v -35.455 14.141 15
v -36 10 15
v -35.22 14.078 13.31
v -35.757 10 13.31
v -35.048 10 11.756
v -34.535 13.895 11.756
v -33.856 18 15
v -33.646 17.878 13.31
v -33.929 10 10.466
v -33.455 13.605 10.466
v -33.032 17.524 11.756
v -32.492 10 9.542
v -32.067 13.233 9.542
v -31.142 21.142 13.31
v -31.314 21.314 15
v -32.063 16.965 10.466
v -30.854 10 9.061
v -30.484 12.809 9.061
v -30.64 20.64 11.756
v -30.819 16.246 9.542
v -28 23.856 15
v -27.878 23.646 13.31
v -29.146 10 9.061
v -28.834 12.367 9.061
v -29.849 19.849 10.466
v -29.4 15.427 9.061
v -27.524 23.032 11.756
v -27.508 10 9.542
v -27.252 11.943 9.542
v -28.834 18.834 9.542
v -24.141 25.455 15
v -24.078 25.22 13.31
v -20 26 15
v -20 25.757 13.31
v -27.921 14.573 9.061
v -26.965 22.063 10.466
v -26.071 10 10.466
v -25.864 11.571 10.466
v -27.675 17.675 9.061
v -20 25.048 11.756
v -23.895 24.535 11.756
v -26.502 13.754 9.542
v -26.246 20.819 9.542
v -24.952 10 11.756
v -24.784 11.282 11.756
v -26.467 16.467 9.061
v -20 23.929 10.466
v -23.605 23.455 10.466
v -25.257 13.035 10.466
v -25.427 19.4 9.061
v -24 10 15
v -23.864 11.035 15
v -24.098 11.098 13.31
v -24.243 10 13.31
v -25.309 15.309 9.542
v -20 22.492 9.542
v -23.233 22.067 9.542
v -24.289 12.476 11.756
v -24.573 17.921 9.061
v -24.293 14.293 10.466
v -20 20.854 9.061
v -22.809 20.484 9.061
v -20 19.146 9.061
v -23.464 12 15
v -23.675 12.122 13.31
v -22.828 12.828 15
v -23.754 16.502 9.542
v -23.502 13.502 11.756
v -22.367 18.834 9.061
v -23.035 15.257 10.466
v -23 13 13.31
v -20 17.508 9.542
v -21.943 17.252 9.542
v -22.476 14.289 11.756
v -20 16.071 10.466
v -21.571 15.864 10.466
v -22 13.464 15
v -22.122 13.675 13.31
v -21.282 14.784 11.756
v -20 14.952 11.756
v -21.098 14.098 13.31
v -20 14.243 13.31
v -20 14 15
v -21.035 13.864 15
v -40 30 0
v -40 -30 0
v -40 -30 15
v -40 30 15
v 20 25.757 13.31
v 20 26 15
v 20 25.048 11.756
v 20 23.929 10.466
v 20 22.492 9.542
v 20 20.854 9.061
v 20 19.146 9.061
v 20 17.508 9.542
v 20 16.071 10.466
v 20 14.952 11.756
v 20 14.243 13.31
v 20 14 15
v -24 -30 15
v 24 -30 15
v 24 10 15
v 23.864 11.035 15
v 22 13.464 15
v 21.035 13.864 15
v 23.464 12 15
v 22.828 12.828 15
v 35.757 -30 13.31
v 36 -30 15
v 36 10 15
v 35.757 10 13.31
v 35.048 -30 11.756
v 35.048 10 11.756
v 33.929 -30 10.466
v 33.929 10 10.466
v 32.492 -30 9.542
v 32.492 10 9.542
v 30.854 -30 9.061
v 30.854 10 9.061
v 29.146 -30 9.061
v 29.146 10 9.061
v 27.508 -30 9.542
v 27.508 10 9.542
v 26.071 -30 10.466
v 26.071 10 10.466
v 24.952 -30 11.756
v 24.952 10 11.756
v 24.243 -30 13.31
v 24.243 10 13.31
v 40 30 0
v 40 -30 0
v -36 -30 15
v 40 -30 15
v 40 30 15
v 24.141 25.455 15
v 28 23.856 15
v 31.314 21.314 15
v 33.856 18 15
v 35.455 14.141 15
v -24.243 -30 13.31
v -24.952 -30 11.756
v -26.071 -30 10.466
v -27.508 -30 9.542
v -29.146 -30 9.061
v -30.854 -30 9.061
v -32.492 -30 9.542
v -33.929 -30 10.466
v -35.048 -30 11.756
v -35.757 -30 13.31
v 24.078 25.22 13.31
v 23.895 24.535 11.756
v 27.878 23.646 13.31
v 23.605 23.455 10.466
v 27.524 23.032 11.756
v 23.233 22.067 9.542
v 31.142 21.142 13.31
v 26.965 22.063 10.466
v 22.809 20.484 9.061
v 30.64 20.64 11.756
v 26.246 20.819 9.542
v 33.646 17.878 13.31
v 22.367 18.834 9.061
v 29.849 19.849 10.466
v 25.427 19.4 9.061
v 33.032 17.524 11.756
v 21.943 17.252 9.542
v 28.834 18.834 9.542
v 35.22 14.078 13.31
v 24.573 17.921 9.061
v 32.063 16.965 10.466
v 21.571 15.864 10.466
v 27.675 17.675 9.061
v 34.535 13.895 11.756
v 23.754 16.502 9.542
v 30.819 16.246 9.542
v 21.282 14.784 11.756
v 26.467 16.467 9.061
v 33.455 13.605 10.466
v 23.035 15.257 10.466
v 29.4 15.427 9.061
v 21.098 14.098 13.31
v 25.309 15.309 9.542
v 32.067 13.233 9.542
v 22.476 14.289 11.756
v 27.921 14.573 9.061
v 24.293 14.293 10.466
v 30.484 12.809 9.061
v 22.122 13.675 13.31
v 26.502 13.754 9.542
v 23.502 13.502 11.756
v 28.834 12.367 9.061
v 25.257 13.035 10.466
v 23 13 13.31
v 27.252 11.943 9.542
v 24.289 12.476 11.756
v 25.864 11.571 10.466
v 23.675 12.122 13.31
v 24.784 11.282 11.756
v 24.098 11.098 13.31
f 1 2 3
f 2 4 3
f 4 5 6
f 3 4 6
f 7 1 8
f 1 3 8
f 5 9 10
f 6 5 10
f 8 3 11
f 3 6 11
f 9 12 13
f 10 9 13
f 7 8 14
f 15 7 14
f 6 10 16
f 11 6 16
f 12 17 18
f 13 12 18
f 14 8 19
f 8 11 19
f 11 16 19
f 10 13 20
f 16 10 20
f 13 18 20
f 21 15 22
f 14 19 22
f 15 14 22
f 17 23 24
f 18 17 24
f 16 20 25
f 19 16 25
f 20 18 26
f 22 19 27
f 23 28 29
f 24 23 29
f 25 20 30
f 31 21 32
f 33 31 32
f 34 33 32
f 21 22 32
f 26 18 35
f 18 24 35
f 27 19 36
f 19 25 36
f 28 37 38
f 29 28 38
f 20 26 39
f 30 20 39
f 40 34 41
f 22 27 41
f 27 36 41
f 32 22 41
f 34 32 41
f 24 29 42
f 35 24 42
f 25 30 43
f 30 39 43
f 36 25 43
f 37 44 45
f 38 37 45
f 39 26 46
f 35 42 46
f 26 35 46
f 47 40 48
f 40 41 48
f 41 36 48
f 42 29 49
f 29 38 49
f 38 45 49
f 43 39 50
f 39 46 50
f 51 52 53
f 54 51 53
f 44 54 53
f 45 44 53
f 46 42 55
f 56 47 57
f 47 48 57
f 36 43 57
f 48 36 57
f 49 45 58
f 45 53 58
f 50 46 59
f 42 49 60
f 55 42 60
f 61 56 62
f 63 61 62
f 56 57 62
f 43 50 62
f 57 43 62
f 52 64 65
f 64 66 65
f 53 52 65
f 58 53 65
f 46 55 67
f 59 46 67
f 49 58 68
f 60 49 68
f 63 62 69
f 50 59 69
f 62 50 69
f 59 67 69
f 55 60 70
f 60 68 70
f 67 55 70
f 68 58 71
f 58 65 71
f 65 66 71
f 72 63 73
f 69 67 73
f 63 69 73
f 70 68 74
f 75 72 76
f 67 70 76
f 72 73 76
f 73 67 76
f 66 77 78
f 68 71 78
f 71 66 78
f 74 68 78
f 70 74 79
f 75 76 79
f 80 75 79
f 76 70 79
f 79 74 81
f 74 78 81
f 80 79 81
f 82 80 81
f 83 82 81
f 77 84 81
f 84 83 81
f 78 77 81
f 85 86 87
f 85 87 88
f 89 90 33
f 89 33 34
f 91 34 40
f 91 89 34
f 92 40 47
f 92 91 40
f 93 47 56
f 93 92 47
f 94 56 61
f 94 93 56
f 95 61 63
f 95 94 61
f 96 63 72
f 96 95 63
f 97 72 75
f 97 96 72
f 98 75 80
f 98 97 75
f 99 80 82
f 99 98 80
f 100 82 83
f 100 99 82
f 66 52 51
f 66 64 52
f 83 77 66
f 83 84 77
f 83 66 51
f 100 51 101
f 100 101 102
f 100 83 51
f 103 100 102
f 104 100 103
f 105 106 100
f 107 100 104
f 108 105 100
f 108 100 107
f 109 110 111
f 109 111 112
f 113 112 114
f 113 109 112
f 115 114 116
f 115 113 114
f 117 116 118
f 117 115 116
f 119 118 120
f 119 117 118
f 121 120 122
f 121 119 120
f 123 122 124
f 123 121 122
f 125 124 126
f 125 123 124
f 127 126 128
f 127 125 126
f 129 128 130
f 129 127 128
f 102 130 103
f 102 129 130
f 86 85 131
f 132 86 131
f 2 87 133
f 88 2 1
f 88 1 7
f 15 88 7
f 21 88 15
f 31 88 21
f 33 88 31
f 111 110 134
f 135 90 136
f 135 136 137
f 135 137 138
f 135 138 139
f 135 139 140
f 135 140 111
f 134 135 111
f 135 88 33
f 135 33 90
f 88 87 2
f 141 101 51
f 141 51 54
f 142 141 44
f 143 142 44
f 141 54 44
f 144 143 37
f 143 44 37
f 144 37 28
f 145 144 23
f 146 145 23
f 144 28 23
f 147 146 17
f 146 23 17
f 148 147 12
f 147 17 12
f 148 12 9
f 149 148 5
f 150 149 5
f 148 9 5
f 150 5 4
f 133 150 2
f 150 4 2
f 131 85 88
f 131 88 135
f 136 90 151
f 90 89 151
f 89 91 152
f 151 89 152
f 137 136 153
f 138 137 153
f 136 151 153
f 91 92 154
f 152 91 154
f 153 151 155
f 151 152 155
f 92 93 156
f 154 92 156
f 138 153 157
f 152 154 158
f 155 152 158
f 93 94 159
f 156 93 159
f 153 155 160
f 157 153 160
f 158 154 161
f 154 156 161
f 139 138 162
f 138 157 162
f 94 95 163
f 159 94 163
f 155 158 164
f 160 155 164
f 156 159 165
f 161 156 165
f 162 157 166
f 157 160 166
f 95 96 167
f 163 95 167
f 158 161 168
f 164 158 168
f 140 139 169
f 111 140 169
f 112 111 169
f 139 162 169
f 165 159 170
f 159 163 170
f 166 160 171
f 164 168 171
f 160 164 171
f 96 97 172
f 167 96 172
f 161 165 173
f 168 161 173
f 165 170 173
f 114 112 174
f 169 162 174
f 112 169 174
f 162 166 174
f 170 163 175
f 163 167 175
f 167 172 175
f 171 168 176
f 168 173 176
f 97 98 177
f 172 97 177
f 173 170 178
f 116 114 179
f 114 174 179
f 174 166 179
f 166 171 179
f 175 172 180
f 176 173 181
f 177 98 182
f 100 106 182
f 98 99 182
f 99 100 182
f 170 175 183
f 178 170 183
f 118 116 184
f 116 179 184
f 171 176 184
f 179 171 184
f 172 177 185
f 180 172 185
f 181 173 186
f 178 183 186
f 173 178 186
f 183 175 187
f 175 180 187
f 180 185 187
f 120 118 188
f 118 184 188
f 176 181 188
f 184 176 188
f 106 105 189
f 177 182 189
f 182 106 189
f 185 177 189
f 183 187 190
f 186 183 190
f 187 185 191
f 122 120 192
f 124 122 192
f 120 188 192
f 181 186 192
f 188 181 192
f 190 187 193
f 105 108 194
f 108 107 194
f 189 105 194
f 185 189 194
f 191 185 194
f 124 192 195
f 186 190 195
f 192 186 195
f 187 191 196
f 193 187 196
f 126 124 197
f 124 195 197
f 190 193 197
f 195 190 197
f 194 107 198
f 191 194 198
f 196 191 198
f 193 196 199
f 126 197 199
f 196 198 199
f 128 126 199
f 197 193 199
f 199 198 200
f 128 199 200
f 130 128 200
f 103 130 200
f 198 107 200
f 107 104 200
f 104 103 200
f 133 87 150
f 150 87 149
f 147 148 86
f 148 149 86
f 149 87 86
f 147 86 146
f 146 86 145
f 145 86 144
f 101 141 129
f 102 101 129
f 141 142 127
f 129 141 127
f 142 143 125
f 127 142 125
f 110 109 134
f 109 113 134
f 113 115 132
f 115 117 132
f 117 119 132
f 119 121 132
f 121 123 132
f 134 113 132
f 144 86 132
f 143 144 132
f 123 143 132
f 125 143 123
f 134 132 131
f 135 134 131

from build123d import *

# Parameters (mm, degrees)
F0_W     = 80
F0_H     = 60
F1_DEPTH = 15


with BuildPart() as f1:
    # F0 (on Top) → F1 (new body)
    with BuildSketch(Plane.XY):
        Rectangle(F0_W, F0_H)
    extrude(amount=F1_DEPTH)

    # F4: sweep along a path in F2
    with BuildLine(Plane.XY.offset(15)) as f4_path:
        Line((-30, -30), (-30, 10))
        ThreePointArc((-30, 10), (-27.071068, 17.071068), (-20, 20))
        Line((-20, 20), (20, 20))
        ThreePointArc((20, 20), (27.071068, 17.071068), (30, 10))
        Line((30, 10), (30, -30))
    # F3 (on face) → F4 (sweep, cut)
    with BuildSketch(Plane.XZ.offset(30)):
        with BuildLine():
            Line((-24, 15), (-36, 15))
            ThreePointArc((-36, 15), (-30, 9), (-24, 15))
        make_face()
    sweep(path=f4_path.line, mode=Mode.SUBTRACT)


solid = f1.part
